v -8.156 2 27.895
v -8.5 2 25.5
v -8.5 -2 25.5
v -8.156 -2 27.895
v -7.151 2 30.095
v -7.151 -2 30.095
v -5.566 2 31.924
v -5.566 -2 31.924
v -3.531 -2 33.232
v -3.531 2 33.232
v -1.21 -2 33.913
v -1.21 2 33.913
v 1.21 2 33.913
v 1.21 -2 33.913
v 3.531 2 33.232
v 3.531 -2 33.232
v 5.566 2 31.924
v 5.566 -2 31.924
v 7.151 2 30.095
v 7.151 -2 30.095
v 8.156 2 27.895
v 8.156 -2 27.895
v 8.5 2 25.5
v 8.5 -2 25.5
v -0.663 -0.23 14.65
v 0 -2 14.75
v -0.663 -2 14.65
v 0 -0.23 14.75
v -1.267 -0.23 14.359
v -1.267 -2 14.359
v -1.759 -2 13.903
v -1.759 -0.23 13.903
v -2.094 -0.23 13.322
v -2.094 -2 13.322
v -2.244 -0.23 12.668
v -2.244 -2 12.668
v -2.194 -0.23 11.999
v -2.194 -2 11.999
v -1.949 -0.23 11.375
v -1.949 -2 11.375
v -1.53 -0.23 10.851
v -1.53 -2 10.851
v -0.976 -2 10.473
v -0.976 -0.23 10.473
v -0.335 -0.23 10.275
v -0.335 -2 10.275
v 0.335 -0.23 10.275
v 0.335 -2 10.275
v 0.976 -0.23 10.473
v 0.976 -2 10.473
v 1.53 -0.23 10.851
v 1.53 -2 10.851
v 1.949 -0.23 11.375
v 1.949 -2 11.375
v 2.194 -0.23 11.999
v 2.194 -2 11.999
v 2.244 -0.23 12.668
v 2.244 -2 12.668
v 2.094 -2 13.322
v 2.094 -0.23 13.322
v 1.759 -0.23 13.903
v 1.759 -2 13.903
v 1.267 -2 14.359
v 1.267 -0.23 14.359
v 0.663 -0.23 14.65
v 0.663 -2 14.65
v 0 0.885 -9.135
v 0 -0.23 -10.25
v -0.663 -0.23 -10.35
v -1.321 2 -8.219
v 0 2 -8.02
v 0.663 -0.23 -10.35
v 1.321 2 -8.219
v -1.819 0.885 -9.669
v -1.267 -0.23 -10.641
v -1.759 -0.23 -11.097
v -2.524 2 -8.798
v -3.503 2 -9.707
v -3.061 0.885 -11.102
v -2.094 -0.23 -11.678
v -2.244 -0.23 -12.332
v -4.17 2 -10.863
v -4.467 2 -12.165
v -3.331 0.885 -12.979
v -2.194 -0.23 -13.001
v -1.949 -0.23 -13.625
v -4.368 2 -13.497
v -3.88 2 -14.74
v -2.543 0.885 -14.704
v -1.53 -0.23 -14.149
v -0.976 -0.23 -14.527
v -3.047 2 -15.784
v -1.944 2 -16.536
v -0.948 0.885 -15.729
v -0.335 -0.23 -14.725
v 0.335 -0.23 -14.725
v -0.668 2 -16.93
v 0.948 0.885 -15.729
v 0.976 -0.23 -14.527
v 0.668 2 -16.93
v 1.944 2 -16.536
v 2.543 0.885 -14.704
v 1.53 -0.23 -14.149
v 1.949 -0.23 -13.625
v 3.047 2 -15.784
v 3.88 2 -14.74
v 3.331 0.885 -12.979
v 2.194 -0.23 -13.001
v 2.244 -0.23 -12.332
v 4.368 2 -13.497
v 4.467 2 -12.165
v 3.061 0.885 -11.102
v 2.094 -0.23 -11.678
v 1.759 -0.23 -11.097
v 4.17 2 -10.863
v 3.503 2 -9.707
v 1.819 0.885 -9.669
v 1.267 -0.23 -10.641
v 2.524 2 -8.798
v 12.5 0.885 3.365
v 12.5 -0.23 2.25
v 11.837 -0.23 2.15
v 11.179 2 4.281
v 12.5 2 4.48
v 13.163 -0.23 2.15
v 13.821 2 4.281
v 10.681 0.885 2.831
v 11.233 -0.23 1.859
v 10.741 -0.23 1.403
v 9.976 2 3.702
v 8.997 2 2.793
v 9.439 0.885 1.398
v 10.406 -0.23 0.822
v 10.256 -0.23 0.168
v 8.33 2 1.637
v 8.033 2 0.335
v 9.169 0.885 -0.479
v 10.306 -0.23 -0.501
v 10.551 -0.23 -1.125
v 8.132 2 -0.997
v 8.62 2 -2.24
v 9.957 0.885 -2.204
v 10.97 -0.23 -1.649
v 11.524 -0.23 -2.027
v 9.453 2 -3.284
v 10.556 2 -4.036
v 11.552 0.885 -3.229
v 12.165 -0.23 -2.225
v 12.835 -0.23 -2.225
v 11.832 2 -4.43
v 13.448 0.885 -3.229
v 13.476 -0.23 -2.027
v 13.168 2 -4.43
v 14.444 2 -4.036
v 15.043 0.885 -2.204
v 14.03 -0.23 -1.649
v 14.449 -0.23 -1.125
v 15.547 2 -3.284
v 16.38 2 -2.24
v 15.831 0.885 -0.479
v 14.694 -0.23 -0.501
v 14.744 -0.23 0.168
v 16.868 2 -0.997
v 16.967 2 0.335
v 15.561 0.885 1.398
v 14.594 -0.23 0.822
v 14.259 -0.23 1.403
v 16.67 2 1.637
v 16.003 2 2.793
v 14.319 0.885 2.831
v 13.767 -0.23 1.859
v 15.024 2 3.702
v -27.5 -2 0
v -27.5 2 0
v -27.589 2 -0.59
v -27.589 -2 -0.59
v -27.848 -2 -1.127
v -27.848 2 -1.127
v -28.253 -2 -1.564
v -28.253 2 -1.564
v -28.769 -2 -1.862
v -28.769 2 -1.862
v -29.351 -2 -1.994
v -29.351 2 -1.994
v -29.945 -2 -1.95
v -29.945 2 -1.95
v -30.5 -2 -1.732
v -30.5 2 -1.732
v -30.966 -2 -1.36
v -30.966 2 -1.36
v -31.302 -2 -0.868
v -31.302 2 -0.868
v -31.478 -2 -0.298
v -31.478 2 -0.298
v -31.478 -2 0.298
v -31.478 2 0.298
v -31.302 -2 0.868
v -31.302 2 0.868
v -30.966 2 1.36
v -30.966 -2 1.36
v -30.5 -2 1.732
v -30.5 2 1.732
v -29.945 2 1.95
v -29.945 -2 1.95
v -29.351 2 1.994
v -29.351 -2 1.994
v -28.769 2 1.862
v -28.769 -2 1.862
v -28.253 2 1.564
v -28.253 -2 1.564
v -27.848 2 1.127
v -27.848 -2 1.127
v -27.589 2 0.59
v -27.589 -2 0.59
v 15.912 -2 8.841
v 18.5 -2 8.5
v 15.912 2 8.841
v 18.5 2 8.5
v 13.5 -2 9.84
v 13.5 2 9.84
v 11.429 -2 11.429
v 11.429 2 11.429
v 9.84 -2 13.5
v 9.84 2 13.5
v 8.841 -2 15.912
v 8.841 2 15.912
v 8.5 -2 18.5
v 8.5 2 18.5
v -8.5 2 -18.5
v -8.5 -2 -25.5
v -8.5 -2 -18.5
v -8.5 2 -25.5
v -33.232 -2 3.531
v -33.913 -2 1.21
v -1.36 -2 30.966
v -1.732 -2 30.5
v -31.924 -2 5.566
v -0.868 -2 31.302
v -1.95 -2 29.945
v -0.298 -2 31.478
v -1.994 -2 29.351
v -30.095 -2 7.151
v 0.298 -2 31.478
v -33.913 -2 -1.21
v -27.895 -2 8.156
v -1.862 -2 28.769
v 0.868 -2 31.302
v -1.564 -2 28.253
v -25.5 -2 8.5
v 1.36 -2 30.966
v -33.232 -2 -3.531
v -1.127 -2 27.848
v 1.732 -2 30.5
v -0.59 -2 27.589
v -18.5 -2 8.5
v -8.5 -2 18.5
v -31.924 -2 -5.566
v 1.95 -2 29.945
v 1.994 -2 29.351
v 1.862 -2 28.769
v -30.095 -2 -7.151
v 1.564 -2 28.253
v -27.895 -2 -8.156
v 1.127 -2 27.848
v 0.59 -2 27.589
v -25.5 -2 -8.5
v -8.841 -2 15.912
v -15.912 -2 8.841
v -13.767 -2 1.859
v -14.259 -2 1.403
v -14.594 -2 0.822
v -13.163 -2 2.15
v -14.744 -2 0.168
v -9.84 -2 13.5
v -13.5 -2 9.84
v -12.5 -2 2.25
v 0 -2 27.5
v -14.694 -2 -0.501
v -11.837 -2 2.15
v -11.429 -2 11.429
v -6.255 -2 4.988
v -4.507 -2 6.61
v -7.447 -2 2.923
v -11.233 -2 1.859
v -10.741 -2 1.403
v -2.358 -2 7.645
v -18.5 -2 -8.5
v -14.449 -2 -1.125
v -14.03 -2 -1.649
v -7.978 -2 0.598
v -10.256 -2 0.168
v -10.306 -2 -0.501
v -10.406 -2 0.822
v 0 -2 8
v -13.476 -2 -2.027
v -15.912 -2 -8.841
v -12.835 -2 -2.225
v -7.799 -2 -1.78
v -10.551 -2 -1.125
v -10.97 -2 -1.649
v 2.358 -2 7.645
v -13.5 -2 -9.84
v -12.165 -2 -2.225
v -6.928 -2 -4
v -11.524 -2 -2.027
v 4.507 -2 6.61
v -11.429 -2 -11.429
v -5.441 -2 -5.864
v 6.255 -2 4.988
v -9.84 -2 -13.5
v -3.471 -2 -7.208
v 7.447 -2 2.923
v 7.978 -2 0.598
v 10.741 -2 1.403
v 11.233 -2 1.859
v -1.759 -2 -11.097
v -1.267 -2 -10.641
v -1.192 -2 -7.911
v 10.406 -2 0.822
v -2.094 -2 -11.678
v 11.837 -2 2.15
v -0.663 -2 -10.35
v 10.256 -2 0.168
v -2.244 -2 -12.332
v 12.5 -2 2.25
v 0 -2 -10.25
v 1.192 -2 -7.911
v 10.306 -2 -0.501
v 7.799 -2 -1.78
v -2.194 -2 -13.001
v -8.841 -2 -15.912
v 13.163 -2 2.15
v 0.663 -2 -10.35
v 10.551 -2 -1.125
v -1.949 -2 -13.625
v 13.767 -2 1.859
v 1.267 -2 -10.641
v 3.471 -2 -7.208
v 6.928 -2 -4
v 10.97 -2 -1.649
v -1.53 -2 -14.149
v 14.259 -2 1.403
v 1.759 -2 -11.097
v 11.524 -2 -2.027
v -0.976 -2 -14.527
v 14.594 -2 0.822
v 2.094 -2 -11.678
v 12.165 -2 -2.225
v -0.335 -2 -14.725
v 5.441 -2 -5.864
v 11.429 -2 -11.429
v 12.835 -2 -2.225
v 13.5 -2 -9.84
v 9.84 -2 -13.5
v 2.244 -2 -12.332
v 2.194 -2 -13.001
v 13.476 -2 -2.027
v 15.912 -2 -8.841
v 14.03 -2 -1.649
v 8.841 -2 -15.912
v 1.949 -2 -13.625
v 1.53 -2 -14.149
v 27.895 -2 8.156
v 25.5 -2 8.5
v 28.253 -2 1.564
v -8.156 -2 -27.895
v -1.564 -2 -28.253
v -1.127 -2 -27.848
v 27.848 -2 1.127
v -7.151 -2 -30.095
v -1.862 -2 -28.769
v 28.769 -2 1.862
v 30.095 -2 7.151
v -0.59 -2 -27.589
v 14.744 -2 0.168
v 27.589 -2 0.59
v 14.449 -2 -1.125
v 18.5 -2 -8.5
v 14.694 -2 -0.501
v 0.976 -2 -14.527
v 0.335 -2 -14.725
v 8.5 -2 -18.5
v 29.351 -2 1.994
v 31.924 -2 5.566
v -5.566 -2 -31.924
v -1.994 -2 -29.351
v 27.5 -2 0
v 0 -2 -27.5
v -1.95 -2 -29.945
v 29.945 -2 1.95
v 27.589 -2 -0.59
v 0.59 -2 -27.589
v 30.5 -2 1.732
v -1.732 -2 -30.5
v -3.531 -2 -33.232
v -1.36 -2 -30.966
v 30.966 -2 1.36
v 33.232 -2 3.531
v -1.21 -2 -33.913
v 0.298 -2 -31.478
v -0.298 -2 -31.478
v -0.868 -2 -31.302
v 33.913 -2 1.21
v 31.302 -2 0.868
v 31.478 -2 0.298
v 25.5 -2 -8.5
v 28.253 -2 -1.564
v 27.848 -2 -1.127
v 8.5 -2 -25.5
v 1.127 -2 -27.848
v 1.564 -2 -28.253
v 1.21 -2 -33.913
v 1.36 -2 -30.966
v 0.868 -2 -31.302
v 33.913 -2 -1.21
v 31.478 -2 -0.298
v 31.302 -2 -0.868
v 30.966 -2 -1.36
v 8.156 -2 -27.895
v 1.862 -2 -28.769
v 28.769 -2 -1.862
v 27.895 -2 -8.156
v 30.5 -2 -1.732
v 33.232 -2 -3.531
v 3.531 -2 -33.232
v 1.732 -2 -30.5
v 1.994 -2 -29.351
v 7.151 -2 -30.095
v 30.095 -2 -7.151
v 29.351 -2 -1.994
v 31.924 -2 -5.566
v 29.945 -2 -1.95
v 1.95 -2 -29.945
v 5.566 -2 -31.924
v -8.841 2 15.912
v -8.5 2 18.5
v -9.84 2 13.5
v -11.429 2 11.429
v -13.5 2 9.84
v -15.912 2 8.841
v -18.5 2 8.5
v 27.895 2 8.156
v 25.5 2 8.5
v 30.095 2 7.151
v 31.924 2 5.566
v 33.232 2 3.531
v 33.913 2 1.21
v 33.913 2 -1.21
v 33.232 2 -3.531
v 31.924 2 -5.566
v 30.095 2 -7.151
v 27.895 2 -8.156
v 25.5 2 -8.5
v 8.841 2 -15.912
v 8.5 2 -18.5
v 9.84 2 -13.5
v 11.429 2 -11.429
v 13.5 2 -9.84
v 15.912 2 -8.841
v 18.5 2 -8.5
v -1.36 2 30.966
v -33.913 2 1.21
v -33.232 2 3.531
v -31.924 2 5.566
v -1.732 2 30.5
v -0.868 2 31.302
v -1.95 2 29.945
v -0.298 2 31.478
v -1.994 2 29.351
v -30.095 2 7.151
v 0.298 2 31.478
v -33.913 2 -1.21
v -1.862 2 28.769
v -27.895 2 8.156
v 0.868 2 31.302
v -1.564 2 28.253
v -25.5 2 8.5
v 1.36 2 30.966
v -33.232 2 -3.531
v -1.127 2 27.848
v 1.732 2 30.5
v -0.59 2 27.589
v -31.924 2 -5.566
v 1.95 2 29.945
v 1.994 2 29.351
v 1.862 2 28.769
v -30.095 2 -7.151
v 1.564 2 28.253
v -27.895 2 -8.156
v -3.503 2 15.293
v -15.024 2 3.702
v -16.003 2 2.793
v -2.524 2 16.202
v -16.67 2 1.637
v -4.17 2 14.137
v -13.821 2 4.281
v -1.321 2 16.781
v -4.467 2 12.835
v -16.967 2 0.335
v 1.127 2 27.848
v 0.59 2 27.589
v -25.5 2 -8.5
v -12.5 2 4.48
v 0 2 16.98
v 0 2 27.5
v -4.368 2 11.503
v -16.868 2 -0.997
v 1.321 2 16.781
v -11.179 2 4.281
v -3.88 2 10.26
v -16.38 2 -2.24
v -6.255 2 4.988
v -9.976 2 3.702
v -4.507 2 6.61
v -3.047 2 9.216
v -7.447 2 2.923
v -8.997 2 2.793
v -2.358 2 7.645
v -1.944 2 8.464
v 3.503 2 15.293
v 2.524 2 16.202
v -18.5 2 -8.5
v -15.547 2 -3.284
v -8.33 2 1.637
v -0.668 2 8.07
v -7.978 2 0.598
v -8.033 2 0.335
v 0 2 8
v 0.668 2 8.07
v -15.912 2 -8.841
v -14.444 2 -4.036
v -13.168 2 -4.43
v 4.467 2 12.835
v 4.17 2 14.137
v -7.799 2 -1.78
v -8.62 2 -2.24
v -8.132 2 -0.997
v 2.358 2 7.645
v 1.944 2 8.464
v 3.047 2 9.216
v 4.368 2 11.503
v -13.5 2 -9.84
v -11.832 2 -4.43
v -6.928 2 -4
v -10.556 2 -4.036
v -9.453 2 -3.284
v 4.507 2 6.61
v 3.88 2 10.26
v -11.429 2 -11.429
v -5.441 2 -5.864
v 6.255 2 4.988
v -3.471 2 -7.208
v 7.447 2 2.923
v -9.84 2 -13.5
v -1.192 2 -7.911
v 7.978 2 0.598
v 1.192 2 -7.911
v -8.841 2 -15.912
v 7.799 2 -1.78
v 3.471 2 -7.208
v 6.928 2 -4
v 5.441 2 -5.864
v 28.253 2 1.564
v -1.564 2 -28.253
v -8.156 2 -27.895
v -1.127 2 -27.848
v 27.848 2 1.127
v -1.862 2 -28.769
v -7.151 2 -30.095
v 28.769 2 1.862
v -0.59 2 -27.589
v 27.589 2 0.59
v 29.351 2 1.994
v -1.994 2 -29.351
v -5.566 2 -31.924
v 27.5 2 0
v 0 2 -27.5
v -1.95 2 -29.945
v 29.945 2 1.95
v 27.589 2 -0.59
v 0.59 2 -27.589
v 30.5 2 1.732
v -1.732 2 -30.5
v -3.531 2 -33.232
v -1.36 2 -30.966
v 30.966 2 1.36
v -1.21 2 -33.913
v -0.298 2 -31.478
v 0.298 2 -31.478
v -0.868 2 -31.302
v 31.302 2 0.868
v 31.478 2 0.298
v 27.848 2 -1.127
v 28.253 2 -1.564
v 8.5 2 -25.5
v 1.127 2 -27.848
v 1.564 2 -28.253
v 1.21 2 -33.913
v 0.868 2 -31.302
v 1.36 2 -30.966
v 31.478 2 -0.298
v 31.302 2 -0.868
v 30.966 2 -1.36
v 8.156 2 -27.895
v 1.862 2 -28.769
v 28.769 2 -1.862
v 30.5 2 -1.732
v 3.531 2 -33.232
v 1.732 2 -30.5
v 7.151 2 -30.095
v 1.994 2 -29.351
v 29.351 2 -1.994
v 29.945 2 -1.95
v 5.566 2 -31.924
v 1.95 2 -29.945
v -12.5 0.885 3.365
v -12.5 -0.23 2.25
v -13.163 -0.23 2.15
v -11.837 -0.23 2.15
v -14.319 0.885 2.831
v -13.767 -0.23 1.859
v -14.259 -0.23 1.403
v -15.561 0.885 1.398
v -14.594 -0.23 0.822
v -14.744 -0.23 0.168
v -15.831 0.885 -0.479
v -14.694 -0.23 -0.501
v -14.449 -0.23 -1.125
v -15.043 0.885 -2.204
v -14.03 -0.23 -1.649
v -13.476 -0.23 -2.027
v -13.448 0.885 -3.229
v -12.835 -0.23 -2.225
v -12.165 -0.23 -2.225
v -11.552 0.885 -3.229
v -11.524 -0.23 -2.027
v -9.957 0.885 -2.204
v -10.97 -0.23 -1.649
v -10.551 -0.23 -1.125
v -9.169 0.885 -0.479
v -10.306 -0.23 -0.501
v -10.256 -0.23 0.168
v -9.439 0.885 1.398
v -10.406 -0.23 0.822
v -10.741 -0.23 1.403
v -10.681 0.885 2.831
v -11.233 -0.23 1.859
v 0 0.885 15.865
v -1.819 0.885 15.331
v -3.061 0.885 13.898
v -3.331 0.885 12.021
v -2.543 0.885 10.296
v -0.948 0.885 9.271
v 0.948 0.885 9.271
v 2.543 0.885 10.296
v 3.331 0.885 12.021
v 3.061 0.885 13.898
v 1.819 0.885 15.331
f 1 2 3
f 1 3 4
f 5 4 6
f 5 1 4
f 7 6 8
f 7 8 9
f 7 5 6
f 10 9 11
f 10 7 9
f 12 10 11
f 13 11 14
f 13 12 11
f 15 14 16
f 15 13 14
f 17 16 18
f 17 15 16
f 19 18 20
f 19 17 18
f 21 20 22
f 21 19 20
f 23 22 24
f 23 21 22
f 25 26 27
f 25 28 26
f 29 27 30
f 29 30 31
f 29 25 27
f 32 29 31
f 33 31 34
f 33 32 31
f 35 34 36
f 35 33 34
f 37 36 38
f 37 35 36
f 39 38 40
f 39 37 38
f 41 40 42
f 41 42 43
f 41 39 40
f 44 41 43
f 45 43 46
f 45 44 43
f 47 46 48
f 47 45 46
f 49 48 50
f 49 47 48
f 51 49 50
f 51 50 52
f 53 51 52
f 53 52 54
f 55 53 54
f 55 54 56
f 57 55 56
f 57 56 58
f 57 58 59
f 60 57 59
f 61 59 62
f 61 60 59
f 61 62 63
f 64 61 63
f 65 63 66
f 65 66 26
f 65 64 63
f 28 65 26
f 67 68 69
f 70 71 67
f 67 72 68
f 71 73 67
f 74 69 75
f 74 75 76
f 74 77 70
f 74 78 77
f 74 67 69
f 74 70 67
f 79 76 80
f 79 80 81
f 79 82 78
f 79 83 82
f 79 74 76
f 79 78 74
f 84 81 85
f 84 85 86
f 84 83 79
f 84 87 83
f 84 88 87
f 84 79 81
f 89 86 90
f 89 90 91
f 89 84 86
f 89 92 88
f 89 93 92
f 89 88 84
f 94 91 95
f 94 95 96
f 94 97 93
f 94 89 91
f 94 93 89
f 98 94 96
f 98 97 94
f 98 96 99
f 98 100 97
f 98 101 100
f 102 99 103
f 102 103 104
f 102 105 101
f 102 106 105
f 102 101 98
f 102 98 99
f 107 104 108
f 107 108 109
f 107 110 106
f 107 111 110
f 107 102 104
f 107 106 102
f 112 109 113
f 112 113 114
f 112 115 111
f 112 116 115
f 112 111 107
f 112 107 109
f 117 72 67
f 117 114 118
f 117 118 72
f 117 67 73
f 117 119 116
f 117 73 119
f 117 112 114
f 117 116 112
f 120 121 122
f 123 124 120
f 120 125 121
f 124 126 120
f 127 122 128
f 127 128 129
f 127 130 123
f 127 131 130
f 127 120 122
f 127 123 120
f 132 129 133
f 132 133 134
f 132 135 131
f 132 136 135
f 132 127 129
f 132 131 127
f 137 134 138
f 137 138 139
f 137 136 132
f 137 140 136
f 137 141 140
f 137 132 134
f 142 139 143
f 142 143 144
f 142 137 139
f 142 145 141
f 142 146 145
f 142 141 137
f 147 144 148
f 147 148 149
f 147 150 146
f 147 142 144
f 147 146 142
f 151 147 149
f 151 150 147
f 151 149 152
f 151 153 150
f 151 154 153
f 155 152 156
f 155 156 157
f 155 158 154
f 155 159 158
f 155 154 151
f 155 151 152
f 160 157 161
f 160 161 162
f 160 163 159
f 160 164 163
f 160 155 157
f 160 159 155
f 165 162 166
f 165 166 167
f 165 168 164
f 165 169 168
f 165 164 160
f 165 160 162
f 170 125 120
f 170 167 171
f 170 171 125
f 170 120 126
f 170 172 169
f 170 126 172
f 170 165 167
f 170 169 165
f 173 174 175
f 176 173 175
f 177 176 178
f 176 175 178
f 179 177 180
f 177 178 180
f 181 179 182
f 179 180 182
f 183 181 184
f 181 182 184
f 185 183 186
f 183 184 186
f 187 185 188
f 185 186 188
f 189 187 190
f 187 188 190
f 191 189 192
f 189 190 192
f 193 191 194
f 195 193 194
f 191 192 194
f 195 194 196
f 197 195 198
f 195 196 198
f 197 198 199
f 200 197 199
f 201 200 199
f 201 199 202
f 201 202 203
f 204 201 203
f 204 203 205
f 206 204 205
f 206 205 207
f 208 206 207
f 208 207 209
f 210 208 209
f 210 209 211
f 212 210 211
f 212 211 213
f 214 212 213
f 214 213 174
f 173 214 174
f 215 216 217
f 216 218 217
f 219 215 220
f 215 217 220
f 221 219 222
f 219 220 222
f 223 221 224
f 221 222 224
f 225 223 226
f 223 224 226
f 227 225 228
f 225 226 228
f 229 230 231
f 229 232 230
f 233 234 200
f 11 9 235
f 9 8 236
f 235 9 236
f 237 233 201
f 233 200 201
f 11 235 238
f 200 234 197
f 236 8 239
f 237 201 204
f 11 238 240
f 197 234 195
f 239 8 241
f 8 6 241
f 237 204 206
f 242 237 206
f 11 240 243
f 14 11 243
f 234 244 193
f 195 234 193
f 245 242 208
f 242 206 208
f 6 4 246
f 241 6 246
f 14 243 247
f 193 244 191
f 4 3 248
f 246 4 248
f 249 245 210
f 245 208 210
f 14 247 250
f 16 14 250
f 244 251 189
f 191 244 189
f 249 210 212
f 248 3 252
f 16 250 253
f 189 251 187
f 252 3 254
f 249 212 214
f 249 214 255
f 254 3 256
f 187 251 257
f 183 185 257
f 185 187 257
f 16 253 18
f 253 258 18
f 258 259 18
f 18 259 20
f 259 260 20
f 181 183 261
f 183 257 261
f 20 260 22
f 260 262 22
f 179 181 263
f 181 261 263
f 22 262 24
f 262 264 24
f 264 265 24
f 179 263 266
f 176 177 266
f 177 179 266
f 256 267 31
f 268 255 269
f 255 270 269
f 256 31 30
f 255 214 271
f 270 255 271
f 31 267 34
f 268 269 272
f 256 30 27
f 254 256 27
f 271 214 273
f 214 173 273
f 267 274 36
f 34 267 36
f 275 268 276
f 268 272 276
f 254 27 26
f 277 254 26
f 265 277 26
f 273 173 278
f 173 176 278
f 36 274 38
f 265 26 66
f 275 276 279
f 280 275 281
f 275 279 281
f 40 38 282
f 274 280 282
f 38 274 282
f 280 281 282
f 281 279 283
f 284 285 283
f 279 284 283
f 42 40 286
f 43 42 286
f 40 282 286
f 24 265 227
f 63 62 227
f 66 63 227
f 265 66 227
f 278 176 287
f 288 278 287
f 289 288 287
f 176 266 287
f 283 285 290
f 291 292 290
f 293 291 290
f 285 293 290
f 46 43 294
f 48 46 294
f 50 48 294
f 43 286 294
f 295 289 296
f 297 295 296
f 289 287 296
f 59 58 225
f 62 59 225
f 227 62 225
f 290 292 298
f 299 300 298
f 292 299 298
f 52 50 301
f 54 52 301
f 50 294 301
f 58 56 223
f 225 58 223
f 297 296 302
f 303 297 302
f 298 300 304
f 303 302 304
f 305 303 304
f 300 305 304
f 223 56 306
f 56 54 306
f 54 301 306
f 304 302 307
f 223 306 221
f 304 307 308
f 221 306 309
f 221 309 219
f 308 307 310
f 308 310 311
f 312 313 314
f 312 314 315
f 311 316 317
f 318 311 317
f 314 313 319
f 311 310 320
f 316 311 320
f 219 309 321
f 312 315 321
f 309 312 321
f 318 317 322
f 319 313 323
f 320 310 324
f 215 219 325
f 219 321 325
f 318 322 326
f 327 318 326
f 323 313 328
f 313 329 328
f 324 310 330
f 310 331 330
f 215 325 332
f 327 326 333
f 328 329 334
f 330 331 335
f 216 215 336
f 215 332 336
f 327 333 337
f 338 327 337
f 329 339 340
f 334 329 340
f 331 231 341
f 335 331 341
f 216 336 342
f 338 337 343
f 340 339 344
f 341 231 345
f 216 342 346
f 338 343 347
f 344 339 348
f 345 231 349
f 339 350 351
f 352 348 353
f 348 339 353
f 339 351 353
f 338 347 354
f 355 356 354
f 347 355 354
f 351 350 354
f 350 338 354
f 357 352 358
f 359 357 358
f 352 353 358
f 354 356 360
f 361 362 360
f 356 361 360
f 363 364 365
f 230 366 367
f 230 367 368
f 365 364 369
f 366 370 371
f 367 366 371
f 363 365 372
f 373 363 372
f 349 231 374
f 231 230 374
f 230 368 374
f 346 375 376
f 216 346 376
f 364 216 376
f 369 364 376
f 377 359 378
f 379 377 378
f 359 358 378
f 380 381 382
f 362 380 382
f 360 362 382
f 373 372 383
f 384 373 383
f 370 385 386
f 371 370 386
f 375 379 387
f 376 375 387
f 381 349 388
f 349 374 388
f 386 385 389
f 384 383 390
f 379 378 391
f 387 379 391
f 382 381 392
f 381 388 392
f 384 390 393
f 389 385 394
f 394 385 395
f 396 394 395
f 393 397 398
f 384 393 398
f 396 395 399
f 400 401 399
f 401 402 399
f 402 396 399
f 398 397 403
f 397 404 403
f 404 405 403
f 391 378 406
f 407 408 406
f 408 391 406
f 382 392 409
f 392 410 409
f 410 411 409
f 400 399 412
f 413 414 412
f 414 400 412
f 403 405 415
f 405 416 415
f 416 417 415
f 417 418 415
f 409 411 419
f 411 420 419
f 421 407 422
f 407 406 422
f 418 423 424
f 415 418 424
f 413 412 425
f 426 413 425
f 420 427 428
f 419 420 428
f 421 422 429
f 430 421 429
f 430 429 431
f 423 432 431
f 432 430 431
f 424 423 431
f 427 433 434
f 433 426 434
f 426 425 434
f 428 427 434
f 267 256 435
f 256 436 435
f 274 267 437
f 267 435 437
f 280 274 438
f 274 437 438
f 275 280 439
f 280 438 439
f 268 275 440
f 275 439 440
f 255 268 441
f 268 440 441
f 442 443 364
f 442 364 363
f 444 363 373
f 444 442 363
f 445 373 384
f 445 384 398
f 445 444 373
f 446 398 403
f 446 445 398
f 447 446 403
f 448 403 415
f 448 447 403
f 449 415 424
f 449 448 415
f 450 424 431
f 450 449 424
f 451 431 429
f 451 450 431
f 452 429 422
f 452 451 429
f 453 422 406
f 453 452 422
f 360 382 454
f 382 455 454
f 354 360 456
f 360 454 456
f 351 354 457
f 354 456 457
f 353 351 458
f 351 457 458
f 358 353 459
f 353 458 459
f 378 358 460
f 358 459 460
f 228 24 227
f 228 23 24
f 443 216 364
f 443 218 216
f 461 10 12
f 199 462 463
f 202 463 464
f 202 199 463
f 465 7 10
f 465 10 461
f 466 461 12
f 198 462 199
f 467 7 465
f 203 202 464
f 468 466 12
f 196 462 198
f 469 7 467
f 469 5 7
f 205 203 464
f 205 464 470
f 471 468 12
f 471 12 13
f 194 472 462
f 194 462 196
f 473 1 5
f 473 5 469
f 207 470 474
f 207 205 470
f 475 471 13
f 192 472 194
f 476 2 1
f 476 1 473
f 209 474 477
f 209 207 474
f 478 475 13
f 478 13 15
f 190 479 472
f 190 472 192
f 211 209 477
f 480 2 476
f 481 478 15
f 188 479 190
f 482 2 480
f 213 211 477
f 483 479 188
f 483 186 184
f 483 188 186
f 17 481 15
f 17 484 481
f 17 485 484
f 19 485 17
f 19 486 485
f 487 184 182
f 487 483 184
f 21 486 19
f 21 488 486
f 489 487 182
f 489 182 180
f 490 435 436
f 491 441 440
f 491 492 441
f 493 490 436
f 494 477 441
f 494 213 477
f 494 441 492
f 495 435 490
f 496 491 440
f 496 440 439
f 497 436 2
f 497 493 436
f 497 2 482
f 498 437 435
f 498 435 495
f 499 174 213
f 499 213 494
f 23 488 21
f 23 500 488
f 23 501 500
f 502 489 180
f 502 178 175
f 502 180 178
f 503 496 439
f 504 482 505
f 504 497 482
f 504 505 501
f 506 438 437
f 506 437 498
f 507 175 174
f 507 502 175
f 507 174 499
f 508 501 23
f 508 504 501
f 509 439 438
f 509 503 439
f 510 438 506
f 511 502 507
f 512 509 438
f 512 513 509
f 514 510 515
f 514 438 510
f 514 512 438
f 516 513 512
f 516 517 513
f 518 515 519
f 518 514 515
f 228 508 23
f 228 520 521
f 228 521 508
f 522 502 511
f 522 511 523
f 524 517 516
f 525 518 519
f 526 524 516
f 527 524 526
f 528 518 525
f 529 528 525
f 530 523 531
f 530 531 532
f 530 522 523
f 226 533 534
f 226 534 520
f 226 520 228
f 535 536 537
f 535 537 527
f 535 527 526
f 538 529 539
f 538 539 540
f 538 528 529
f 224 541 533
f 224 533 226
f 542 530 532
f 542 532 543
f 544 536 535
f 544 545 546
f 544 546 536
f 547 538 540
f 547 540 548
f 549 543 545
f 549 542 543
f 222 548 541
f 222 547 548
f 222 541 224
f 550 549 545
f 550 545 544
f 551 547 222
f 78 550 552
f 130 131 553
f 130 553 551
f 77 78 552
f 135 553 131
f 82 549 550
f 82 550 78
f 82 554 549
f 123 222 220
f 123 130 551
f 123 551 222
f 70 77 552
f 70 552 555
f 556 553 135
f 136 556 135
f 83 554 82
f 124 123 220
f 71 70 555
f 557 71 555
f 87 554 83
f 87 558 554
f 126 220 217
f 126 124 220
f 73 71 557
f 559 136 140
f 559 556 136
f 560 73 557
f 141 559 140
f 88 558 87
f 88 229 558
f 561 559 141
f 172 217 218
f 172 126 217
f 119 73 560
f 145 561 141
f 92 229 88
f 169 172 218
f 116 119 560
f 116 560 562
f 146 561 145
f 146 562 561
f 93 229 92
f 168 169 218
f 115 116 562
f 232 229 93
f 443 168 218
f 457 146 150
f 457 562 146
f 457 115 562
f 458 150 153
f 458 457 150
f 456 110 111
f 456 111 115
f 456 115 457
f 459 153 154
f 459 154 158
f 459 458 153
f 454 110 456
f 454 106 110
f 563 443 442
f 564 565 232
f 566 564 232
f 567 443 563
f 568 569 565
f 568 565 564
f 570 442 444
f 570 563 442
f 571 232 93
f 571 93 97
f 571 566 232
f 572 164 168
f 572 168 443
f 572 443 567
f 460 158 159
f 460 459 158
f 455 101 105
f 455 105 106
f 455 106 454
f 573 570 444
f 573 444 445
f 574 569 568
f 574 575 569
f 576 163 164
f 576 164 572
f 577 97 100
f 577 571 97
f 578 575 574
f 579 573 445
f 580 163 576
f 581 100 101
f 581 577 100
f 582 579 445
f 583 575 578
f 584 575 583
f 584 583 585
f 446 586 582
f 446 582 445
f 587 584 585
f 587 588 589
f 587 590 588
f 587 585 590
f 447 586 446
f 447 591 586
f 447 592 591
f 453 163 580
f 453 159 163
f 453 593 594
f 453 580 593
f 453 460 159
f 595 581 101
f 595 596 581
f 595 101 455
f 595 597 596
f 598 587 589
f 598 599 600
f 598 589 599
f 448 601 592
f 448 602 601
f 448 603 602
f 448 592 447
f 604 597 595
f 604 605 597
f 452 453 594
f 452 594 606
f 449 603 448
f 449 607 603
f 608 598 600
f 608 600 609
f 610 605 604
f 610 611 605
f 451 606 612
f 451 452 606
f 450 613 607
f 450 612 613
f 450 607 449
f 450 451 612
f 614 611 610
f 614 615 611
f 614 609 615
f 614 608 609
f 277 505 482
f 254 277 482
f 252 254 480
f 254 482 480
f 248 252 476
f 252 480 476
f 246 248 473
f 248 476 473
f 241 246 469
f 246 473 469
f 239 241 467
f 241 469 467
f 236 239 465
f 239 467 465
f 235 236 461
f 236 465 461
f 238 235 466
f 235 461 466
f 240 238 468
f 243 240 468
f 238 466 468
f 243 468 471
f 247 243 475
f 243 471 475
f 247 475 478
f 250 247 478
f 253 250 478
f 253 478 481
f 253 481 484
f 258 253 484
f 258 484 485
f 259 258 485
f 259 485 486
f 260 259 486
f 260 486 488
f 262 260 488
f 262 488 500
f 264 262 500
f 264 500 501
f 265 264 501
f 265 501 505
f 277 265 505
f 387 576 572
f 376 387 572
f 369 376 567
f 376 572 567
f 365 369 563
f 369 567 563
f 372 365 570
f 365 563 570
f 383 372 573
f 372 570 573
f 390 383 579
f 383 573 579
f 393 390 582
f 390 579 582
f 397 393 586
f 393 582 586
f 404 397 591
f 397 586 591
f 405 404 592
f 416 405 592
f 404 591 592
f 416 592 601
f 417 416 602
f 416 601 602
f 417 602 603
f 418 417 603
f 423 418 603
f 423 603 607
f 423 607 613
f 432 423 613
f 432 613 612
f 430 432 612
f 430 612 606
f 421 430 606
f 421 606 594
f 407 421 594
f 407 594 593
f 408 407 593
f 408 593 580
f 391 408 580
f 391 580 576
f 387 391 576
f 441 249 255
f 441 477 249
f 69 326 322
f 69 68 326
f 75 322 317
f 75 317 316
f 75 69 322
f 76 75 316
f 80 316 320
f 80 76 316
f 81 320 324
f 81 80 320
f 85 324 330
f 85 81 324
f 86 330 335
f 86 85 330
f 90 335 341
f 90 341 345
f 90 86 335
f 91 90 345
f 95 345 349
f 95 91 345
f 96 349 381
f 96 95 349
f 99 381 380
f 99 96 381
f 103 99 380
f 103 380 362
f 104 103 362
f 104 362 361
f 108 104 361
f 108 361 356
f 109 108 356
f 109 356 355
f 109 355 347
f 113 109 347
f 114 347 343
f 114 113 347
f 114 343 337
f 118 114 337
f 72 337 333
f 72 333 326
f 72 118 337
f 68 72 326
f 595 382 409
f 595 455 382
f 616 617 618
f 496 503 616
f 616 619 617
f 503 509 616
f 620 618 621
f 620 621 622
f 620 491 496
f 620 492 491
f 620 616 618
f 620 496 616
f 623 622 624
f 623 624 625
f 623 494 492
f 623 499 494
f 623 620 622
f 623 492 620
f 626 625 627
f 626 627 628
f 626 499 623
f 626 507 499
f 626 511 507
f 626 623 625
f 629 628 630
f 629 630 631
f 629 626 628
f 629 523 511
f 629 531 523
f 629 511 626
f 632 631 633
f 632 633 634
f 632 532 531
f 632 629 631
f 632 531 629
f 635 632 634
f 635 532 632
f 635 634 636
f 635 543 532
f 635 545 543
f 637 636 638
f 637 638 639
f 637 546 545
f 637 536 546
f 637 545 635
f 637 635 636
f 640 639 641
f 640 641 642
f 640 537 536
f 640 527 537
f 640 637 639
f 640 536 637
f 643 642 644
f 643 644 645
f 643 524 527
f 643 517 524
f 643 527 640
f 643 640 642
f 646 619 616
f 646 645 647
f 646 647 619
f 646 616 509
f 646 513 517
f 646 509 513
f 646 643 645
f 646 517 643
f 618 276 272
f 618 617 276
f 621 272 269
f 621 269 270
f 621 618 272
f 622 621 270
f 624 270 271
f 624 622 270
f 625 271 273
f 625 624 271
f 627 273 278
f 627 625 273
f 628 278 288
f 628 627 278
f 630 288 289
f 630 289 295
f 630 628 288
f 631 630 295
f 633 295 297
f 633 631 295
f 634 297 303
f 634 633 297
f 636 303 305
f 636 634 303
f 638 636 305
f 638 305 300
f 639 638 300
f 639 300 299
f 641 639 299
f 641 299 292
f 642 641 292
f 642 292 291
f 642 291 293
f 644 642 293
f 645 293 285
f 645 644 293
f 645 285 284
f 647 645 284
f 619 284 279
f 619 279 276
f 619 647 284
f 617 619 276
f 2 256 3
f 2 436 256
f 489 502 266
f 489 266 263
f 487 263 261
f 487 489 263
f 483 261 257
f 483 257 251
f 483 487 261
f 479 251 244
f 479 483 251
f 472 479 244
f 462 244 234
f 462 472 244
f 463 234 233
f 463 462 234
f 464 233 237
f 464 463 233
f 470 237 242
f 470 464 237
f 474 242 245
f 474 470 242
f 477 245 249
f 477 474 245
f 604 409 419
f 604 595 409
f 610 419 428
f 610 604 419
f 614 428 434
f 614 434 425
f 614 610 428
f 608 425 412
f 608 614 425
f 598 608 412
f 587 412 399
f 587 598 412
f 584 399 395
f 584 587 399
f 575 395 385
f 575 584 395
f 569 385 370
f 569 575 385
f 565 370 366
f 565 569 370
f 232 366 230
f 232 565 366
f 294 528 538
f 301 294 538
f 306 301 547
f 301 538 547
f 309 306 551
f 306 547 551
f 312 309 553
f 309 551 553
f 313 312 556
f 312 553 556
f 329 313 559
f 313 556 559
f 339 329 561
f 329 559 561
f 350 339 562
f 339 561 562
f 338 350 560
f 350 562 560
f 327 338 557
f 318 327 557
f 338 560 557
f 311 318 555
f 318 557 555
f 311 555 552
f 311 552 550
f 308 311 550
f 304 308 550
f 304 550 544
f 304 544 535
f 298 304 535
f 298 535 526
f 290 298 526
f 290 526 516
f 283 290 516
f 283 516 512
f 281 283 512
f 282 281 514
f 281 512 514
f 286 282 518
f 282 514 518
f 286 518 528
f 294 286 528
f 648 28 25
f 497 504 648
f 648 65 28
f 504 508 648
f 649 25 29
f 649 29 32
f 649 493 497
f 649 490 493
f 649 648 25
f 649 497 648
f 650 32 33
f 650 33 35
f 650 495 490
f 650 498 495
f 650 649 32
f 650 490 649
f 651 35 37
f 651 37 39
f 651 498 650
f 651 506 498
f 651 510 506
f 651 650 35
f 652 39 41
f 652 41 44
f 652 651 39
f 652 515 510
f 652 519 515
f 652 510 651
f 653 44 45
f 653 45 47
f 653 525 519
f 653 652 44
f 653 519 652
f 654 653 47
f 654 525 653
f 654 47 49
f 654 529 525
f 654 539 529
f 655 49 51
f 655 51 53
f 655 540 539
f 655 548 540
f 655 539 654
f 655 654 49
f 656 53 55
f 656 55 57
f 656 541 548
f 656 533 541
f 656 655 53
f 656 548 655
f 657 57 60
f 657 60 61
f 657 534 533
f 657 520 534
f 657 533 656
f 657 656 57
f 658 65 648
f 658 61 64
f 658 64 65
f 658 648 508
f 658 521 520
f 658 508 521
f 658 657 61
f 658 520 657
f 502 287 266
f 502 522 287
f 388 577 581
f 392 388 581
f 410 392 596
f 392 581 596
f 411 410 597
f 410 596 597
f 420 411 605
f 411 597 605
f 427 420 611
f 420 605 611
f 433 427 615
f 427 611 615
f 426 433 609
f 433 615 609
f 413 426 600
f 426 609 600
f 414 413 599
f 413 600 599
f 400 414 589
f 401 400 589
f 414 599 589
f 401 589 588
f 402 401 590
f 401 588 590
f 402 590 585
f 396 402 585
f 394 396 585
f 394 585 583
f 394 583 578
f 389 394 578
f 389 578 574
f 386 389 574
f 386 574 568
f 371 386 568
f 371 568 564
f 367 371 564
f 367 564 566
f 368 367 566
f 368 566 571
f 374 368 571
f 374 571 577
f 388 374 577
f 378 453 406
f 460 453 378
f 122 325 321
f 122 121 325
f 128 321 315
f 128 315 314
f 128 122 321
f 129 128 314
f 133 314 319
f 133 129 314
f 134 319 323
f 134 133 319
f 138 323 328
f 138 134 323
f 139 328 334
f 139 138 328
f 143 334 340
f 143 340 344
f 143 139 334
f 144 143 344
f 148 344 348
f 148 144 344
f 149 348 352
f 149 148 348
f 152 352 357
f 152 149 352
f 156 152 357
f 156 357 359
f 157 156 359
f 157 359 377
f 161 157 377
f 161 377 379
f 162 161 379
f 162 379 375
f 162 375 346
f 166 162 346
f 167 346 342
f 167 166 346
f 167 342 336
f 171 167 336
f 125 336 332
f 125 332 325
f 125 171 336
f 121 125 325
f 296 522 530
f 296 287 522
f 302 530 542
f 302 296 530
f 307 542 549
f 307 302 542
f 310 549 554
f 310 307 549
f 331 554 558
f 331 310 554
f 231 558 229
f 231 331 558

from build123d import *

# Parameters (mm, degrees)
ESBO_O1_W                           = 17
ESBO_O1_H                           = 17
RESSALTO_EXTRUS_O1_DEPTH            = 2
FILETE1_R                           = 10
ESBO_O3_R                           = 8
ESBO_O3_R_2                         = 2
CORTE_EXTRUS_O1_DEPTH               = 49.249352327
PADR_OCIRCULAR1_COUNT               = 4
ESCAREADO_PARA_SFHCS_M41_AT_2_COUNT = 2
ESCAREADO_PARA_SFHCS_M41_AT_2_PITCH = 17.67766953
ESCAREADO_PARA_SFHCS_M41_AT_3_COUNT = 2
ESCAREADO_PARA_SFHCS_M41_AT_3_PITCH = 25
ESCAREADO_PARA_SFHCS_M41_AT_4_COUNT = 2
ESCAREADO_PARA_SFHCS_M41_AT_4_PITCH = 17.67766953


with BuildPart() as part:
    # Esboço1 → Ressalto-extrusão1 (new, symmetric)
    with BuildSketch(Plane(origin=(0, 0, 0), x_dir=(1, 0, 0), z_dir=(0, 1, 0))):
        with BuildLine():
            Line((-8.5, -8.5), (-8.5, 8.5))
            Line((-8.5, 8.5), (-25.5, 8.5))
            ThreePointArc((-25.5, 8.5), (-34, 0), (-25.5, -8.5))
            Line((-25.5, -8.5), (-8.5, -8.5))
        make_face()
        with BuildLine():
            Line((8.5, 8.5), (8.5, 25.5))
            ThreePointArc((8.5, 25.5), (0, 34), (-8.5, 25.5))
            Line((-8.5, 25.5), (-8.5, 8.5))
            Line((-8.5, 8.5), (8.5, 8.5))
        make_face()
        Rectangle(ESBO_O1_W, ESBO_O1_H)
        with BuildLine():
            Line((25.5, 8.5), (8.5, 8.5))
            Line((8.5, 8.5), (8.5, -8.5))
            Line((8.5, -8.5), (25.5, -8.5))
            ThreePointArc((25.5, -8.5), (34, 0), (25.5, 8.5))
        make_face()
        with BuildLine():
            Line((8.5, -25.5), (8.5, -8.5))
            Line((8.5, -8.5), (-8.5, -8.5))
            Line((-8.5, -8.5), (-8.5, -25.5))
            ThreePointArc((-8.5, -25.5), (0, -34), (8.5, -25.5))
        make_face()
    extrude(amount=RESSALTO_EXTRUS_O1_DEPTH, both=True)

    # Filete1
    filete1_edges = [part.edges().sort_by_distance(p)[0] for p in [
        (-8.5, 0, -8.5),
        (8.5, 0, -8.5),
        (8.5, 0, 8.5),
        (-8.5, 0, 8.5),
    ]]
    fillet(filete1_edges, radius=FILETE1_R)

    # Esboço3 → Corte-extrusão1 (cut, through all)
    with BuildSketch(Plane(origin=(0, 2, 0), x_dir=(1, 0, 0), z_dir=(0, 1, 0))):
        with Locations(Location((0, 0, 0), (0, 0, 270))):
            Circle(ESBO_O3_R)
        with Locations(Location((0, 29.5, 0), (0, 0, 270))):
            Circle(ESBO_O3_R_2)
    corte_extrus_o1 = extrude(amount=-CORTE_EXTRUS_O1_DEPTH, mode=Mode.SUBTRACT)

    # PadrãoCircular1: Corte-extrusão1 ×4 about axis
    padr_ocircular1_axis = Axis((0, 0, 0), (0, 1, 0))
    for i in range(1, PADR_OCIRCULAR1_COUNT):
        add(corte_extrus_o1.rotate(padr_ocircular1_axis, i * 360 / PADR_OCIRCULAR1_COUNT), mode=Mode.SUBTRACT)

    # Esboço6 → Escareado para SFHCS M41 (revolve, cut)
    with BuildSketch(Plane(origin=(-12.5, 2, 0), x_dir=(0, 0, 1), z_dir=(1, 0, 0))):
        Polygon((0, 0), (0, 4), (2.25, 4), (2.25, 2.23), (4.48, 0), align=None)
    escareado_para_sfhcs_m41 = revolve(axis=Axis((-12.5, 8.35, 0), (0, -1, 0)), mode=Mode.SUBTRACT)

    # Escareado para SFHCS M41 at 2: Escareado para SFHCS M41 ×2
    with Locations(*[Vector(0.7071067811865476, 0, -0.7071067811865476) * (i * ESCAREADO_PARA_SFHCS_M41_AT_2_PITCH) for i in range(1, ESCAREADO_PARA_SFHCS_M41_AT_2_COUNT)]):
        add(escareado_para_sfhcs_m41, mode=Mode.SUBTRACT)

    # Escareado para SFHCS M41 at 3: Escareado para SFHCS M41 ×2
    with Locations(*[(i * ESCAREADO_PARA_SFHCS_M41_AT_3_PITCH, 0, 0) for i in range(1, ESCAREADO_PARA_SFHCS_M41_AT_3_COUNT)]):
        add(escareado_para_sfhcs_m41, mode=Mode.SUBTRACT)

    # Escareado para SFHCS M41 at 4: Escareado para SFHCS M41 ×2
    with Locations(*[Vector(0.7071067811865476, 0, 0.7071067811865476) * (i * ESCAREADO_PARA_SFHCS_M41_AT_4_PITCH) for i in range(1, ESCAREADO_PARA_SFHCS_M41_AT_4_COUNT)]):
        add(escareado_para_sfhcs_m41, mode=Mode.SUBTRACT)


solid = part.part
